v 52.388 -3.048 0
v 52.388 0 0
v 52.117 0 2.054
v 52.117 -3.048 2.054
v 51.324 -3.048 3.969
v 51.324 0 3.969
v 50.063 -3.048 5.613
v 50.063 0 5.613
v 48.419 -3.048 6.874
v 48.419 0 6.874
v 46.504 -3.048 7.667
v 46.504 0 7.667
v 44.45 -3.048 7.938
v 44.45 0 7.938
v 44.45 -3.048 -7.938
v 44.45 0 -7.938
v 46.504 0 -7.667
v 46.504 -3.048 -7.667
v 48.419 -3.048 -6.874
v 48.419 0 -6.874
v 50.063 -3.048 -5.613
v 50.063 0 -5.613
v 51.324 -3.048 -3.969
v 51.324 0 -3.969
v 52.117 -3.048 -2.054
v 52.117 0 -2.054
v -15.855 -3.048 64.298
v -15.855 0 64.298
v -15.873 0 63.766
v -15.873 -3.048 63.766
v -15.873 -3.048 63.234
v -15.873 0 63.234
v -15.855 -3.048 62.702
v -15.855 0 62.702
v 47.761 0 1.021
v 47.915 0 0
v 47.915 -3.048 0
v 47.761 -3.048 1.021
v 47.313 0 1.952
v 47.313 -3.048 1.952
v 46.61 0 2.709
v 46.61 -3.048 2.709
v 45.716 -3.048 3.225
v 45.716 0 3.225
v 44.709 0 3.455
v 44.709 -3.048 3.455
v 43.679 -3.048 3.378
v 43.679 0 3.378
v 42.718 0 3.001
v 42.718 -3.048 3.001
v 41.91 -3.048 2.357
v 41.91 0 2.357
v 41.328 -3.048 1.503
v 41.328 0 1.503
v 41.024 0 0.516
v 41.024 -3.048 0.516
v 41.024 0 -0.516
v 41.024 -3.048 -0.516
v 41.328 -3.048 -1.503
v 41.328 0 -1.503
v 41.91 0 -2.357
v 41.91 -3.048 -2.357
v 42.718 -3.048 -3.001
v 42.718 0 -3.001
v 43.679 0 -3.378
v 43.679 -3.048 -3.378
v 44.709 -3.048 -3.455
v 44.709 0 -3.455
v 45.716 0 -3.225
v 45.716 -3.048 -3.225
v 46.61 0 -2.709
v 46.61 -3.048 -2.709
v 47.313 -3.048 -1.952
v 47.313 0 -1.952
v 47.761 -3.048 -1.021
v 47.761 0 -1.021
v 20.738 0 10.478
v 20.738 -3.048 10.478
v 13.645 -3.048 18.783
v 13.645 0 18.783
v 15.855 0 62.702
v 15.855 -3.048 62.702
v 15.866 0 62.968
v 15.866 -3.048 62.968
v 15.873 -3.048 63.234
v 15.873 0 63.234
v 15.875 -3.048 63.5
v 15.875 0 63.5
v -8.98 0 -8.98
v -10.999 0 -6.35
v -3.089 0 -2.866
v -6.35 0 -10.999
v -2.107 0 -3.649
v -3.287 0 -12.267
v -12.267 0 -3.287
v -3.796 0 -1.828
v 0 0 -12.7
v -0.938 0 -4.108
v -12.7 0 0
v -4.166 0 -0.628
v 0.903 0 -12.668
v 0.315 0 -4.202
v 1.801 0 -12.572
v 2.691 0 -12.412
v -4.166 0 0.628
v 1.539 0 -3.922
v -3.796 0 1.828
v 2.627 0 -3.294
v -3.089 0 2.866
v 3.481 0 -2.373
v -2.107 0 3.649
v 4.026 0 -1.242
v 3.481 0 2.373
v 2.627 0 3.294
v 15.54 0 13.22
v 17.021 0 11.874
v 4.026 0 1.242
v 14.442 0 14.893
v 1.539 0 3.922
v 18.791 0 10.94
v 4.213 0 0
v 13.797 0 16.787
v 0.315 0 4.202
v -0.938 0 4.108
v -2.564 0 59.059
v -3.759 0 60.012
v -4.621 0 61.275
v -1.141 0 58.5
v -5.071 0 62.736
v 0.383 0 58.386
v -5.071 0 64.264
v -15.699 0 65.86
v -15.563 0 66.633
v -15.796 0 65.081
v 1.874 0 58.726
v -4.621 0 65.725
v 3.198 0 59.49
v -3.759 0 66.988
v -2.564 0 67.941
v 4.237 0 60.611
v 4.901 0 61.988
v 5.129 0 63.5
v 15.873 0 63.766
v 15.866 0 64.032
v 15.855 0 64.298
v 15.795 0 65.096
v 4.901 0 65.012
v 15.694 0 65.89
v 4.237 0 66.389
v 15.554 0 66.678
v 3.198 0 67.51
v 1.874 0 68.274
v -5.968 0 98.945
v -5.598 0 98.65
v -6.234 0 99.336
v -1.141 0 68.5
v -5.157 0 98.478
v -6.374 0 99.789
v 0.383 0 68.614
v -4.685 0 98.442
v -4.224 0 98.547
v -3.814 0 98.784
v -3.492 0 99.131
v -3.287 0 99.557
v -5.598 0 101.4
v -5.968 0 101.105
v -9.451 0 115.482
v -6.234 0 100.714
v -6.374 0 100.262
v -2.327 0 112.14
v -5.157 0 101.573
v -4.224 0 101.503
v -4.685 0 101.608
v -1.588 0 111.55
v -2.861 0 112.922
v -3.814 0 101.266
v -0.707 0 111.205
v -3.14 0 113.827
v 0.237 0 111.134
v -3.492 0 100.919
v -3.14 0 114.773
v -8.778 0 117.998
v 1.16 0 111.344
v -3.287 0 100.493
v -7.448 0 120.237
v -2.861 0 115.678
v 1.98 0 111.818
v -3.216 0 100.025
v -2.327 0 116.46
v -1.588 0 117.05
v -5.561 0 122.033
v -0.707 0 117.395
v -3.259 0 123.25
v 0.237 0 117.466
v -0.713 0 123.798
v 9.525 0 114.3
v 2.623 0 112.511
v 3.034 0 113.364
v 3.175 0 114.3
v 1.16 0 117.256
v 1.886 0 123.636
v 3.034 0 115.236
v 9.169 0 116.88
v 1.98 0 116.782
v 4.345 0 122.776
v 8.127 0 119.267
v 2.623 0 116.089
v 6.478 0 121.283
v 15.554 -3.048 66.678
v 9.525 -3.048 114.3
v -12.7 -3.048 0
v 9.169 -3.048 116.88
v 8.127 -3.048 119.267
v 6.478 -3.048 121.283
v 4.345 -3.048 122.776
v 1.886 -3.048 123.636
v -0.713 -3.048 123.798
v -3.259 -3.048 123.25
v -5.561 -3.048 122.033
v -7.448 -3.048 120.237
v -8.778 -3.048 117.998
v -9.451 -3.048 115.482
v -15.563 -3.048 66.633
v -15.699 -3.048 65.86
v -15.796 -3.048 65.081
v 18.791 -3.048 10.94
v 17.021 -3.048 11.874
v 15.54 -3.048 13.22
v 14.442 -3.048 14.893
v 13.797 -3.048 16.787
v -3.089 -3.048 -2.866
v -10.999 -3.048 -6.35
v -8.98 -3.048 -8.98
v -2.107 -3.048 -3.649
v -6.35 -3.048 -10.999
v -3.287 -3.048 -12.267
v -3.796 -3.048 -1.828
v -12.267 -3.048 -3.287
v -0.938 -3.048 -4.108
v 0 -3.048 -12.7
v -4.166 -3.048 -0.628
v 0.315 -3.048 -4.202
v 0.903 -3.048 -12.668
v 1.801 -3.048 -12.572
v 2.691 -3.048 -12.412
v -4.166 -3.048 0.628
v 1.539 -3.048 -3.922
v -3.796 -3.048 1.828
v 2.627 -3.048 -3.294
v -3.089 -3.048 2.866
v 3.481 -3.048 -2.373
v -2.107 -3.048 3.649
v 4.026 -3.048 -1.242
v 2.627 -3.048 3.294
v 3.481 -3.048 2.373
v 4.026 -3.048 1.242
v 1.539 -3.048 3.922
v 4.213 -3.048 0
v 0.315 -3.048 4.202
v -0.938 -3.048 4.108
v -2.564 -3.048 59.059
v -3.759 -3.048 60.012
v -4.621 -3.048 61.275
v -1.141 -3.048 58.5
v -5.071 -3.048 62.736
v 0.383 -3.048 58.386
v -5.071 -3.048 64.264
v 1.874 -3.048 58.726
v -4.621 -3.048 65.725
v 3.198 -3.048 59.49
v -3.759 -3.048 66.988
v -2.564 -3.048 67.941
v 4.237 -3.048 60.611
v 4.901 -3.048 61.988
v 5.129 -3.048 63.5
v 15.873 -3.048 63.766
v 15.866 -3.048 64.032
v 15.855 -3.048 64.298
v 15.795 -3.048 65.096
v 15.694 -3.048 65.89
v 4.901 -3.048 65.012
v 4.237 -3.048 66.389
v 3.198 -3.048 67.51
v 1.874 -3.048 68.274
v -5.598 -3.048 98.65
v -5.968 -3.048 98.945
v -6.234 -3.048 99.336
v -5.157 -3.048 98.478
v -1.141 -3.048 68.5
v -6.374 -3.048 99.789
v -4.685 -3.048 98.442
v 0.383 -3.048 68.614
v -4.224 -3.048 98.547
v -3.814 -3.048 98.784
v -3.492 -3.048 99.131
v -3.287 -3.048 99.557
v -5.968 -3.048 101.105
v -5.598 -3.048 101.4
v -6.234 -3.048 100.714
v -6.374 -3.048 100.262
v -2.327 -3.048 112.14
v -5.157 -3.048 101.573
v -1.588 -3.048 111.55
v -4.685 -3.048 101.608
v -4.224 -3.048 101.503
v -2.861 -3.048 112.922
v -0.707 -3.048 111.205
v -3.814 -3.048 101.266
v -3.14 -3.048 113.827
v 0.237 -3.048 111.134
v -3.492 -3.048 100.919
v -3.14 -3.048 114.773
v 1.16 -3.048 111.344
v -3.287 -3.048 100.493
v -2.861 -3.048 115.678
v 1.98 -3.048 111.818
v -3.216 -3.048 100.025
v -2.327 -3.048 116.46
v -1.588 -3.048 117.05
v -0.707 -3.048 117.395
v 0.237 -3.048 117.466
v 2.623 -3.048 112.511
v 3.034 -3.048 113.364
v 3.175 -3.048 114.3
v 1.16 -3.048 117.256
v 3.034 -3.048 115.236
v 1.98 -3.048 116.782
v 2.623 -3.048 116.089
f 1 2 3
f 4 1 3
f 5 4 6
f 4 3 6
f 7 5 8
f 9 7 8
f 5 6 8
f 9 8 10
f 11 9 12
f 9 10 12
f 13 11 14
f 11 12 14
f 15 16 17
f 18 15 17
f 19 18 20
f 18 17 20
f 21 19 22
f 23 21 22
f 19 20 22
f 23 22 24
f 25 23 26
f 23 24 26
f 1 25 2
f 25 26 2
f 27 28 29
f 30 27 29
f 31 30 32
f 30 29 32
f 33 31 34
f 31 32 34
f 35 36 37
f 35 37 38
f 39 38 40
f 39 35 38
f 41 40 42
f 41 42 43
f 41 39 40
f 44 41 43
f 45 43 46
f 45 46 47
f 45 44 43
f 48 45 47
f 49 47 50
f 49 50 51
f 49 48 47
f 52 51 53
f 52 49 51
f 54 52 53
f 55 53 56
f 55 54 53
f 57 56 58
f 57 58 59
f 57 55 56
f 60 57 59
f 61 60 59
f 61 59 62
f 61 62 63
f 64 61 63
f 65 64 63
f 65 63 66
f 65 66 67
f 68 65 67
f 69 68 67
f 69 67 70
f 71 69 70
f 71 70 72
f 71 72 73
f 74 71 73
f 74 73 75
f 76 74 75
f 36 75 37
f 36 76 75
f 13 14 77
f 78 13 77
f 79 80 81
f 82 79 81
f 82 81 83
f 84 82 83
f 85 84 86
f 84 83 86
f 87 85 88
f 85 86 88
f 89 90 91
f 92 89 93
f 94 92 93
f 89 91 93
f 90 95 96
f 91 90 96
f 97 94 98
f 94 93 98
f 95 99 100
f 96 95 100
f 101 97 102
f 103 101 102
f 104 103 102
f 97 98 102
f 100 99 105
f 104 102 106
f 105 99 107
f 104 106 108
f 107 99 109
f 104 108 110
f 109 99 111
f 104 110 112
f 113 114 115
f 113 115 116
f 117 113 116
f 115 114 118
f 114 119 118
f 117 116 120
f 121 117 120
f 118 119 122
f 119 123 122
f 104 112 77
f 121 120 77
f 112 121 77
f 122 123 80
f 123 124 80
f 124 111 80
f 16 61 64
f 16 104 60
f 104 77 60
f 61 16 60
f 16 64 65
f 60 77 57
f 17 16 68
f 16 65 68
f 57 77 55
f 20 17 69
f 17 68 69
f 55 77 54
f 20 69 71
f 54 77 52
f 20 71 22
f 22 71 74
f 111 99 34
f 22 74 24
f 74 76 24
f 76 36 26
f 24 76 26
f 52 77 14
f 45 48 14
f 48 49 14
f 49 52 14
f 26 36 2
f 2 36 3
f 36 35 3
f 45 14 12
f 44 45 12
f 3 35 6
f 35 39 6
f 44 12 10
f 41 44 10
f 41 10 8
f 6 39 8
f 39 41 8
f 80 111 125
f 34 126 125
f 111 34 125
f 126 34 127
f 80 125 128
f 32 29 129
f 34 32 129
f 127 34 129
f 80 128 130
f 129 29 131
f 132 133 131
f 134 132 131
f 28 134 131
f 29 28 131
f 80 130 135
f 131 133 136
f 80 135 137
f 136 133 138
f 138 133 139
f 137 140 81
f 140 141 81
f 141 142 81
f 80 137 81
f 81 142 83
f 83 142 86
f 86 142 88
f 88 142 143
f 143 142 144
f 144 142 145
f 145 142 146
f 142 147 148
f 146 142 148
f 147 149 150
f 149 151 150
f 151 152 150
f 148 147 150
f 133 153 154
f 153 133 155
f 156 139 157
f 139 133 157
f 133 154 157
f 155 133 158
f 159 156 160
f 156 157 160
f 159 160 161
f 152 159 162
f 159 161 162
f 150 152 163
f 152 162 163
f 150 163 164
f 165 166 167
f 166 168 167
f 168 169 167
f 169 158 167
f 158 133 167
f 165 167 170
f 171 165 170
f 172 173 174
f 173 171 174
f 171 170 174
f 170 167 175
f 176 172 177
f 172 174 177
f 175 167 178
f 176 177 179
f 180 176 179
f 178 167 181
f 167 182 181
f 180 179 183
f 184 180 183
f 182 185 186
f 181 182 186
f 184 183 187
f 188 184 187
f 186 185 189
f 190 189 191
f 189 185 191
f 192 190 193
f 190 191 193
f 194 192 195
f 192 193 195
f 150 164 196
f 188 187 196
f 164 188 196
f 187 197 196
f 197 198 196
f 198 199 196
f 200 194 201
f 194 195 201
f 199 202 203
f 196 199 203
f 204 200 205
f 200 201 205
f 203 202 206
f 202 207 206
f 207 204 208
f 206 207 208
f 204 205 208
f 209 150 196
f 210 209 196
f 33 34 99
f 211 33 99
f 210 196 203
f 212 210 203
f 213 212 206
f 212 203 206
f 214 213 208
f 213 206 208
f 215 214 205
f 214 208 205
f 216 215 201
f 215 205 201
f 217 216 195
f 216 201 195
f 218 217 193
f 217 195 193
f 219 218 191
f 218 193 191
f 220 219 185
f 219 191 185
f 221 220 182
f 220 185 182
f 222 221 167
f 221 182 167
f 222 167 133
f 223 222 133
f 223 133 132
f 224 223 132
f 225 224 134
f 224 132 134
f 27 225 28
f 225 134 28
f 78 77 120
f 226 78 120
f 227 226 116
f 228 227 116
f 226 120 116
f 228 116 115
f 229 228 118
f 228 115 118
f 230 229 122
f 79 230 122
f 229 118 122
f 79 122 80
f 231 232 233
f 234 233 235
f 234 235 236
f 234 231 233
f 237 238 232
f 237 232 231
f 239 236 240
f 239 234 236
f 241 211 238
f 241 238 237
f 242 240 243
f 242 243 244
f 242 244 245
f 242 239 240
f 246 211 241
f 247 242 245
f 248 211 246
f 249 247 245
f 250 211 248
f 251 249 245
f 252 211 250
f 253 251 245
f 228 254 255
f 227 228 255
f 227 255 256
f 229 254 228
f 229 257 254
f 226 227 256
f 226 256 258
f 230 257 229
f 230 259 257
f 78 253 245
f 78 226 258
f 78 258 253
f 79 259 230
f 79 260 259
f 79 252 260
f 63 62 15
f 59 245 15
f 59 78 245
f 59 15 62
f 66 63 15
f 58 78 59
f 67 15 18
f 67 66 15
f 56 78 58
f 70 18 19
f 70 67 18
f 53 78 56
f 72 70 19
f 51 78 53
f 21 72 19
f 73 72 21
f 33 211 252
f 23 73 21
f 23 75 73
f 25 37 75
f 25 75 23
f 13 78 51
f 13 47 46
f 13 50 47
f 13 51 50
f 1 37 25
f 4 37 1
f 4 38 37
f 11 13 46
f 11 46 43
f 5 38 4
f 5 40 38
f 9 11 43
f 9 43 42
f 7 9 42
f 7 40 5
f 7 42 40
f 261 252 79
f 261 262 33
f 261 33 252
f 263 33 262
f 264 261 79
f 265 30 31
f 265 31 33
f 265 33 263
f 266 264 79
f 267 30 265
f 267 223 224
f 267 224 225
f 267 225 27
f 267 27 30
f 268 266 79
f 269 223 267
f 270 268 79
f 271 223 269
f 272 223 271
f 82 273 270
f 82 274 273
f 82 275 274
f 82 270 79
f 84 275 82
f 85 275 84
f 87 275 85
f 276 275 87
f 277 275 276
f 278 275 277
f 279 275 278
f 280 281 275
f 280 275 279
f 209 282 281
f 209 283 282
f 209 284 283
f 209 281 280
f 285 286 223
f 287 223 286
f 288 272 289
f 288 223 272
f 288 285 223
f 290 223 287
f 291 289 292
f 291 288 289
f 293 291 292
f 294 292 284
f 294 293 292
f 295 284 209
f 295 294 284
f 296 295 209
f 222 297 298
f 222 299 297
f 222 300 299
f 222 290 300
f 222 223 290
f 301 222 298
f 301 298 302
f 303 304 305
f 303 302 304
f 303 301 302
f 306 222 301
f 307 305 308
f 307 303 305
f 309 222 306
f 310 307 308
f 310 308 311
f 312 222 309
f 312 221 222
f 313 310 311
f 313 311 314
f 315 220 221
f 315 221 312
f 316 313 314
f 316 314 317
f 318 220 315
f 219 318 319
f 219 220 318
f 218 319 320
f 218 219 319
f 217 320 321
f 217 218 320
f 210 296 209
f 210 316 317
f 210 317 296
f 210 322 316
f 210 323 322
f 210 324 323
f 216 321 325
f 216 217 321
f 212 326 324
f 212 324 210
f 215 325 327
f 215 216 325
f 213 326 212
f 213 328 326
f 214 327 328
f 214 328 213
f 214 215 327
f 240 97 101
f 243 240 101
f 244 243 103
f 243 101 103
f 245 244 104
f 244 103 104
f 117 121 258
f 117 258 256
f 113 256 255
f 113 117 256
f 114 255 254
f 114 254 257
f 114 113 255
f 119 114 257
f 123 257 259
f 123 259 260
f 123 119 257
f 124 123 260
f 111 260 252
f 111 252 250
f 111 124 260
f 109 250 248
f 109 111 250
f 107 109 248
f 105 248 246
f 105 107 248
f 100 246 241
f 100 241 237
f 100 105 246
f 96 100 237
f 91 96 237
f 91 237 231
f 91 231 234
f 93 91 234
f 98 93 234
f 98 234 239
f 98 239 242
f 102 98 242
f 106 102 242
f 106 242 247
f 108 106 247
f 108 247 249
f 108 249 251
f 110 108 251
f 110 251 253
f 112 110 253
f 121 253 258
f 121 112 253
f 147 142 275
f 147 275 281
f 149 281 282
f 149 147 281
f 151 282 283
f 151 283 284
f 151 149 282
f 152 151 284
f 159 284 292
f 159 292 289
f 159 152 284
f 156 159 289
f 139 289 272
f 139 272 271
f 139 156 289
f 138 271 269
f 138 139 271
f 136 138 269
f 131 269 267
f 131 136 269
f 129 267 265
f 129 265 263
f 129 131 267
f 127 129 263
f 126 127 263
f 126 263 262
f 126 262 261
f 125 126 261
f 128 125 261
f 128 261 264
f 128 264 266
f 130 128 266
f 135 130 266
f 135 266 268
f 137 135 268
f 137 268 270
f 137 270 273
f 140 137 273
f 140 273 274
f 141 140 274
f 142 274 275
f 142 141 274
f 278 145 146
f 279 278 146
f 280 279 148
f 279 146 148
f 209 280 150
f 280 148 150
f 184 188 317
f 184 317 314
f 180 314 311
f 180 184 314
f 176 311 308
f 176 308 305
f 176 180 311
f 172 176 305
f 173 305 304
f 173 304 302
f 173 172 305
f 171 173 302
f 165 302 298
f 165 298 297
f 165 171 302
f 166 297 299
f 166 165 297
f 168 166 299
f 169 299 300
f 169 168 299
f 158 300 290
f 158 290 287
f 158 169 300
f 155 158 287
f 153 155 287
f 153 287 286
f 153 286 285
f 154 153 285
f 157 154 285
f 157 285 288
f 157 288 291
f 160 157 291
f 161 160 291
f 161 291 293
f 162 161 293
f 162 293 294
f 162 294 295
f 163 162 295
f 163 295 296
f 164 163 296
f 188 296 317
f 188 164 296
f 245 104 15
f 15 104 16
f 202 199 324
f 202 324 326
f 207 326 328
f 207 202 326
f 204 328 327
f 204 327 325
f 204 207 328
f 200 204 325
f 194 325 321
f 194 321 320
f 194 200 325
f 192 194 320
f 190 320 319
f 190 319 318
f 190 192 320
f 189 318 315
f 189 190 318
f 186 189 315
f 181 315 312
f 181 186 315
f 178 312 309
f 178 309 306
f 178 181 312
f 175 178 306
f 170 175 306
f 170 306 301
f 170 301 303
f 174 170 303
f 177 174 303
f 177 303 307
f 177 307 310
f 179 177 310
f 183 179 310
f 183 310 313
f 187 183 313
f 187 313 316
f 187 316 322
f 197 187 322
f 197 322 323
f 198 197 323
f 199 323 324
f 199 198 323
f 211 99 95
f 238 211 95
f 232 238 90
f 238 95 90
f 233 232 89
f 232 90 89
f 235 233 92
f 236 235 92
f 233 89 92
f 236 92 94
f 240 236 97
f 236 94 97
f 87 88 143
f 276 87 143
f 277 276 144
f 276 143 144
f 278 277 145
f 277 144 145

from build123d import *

# Parameters (mm, degrees)
F0_R     = 4.213331
F0_R_2   = 5.128529
F0_R_3   = 3.464696
F0_R_4   = 1.5875
F0_R_5   = 3.175
F1_DEPTH = 3.048


with BuildPart() as f1:
    # F0 (on Front) → F1 (new body)
    with BuildSketch(Plane.XZ):
        with BuildLine():
            Line((2.690542, 12.411728), (0, 12.7))
            ThreePointArc((0, 12.7), (-8.980256, 8.980256), (-12.7, 0))
            ThreePointArc((-12.7, 0), (-8.980256, -8.980256), (0, -12.7))
            Line((0, -12.7), (2.690542, -12.411728))
            ThreePointArc((2.690542, -12.411728), (12.7, 0), (2.690542, 12.411728))
        make_face()
        Circle(F0_R, mode=Mode.SUBTRACT)
        with BuildLine():
            ThreePointArc((-12.7, 0), (-8.980256, 8.980256), (0, 12.7))
            Line((0, 12.7), (2.690542, 12.411728))
            ThreePointArc((2.690542, 12.411728), (12.7, 0), (2.690542, -12.411728))
            Line((2.690542, -12.411728), (44.45, -7.9375))
            ThreePointArc((44.45, -7.9375), (36.5125, 0), (44.45, 7.9375))
            Line((44.45, 7.9375), (20.738262, 10.478043))
            ThreePointArc((20.738262, 10.478043), (15.540023, 13.219546), (13.645066, 18.782519))
            Line((13.645066, 18.782519), (15.854942, 62.702238))
            ThreePointArc((15.854942, 62.702238), (0, 47.625), (-15.854942, 62.702238))
            Line((-15.854942, 62.702238), (-12.7, 0))
        make_face()
        with BuildLine():
            Line((2.690542, -12.411728), (0, -12.7))
            ThreePointArc((0, -12.7), (1.352971, -12.627726), (2.690542, -12.411728))
        make_face()
        with BuildLine():
            ThreePointArc((-15.854942, 64.297762), (-15.875, 63.5), (-15.854942, 62.702238))
            ThreePointArc((-15.854942, 62.702238), (0, 47.625), (15.854942, 62.702238))
            ThreePointArc((15.854942, 62.702238), (15.869985, 63.100993), (15.875, 63.5))
            ThreePointArc((15.875, 63.5), (15.869985, 63.899007), (15.854942, 64.297762))
            Line((15.854942, 64.297762), (15.553577, 66.678343))
            ThreePointArc((15.553577, 66.678343), (-0.023207, 79.374983), (-15.562803, 66.632855))
            Line((-15.562803, 66.632855), (-15.854942, 64.297762))
        make_face()
        with Locations((0, 63.5)):
            Circle(F0_R_2, mode=Mode.SUBTRACT)
        with BuildLine():
            ThreePointArc((-15.562803, 66.632855), (-15.752201, 65.470729), (-15.854942, 64.297762))
            Line((-15.854942, 64.297762), (-15.562803, 66.632855))
        make_face()
        with BuildLine():
            ThreePointArc((44.45, 7.9375), (36.5125, 0), (44.45, -7.9375))
            ThreePointArc((44.45, -7.9375), (50.06266, -5.61266), (52.3875, 0))
            ThreePointArc((52.3875, 0), (50.06266, 5.61266), (44.45, 7.9375))
        make_face()
        with Locations((44.45, 0)):
            Circle(F0_R_3, mode=Mode.SUBTRACT)
        with BuildLine():
            Line((-9.451321, 115.482438), (-15.562803, 66.632855))
            ThreePointArc((-15.562803, 66.632855), (-0.023207, 79.374983), (15.553577, 66.678343))
            Line((15.553577, 66.678343), (9.525, 114.3))
            ThreePointArc((9.525, 114.3), (-0.592365, 104.793438), (-9.451321, 115.482438))
        make_face()
        with Locations((-4.803868, 100.0252)):
            Circle(F0_R_4, mode=Mode.SUBTRACT)
        with BuildLine():
            ThreePointArc((15.854942, 64.297762), (15.749304, 65.493754), (15.553577, 66.678343))
            Line((15.553577, 66.678343), (15.854942, 64.297762))
        make_face()
        with BuildLine():
            ThreePointArc((9.525, 114.3), (0.592365, 123.806562), (-9.451321, 115.482438))
            ThreePointArc((-9.451321, 115.482438), (-0.592365, 104.793438), (9.525, 114.3))
        make_face()
        with Locations((0, 114.3)):
            Circle(F0_R_5, mode=Mode.SUBTRACT)
    extrude(amount=F1_DEPTH)


solid = f1.part
